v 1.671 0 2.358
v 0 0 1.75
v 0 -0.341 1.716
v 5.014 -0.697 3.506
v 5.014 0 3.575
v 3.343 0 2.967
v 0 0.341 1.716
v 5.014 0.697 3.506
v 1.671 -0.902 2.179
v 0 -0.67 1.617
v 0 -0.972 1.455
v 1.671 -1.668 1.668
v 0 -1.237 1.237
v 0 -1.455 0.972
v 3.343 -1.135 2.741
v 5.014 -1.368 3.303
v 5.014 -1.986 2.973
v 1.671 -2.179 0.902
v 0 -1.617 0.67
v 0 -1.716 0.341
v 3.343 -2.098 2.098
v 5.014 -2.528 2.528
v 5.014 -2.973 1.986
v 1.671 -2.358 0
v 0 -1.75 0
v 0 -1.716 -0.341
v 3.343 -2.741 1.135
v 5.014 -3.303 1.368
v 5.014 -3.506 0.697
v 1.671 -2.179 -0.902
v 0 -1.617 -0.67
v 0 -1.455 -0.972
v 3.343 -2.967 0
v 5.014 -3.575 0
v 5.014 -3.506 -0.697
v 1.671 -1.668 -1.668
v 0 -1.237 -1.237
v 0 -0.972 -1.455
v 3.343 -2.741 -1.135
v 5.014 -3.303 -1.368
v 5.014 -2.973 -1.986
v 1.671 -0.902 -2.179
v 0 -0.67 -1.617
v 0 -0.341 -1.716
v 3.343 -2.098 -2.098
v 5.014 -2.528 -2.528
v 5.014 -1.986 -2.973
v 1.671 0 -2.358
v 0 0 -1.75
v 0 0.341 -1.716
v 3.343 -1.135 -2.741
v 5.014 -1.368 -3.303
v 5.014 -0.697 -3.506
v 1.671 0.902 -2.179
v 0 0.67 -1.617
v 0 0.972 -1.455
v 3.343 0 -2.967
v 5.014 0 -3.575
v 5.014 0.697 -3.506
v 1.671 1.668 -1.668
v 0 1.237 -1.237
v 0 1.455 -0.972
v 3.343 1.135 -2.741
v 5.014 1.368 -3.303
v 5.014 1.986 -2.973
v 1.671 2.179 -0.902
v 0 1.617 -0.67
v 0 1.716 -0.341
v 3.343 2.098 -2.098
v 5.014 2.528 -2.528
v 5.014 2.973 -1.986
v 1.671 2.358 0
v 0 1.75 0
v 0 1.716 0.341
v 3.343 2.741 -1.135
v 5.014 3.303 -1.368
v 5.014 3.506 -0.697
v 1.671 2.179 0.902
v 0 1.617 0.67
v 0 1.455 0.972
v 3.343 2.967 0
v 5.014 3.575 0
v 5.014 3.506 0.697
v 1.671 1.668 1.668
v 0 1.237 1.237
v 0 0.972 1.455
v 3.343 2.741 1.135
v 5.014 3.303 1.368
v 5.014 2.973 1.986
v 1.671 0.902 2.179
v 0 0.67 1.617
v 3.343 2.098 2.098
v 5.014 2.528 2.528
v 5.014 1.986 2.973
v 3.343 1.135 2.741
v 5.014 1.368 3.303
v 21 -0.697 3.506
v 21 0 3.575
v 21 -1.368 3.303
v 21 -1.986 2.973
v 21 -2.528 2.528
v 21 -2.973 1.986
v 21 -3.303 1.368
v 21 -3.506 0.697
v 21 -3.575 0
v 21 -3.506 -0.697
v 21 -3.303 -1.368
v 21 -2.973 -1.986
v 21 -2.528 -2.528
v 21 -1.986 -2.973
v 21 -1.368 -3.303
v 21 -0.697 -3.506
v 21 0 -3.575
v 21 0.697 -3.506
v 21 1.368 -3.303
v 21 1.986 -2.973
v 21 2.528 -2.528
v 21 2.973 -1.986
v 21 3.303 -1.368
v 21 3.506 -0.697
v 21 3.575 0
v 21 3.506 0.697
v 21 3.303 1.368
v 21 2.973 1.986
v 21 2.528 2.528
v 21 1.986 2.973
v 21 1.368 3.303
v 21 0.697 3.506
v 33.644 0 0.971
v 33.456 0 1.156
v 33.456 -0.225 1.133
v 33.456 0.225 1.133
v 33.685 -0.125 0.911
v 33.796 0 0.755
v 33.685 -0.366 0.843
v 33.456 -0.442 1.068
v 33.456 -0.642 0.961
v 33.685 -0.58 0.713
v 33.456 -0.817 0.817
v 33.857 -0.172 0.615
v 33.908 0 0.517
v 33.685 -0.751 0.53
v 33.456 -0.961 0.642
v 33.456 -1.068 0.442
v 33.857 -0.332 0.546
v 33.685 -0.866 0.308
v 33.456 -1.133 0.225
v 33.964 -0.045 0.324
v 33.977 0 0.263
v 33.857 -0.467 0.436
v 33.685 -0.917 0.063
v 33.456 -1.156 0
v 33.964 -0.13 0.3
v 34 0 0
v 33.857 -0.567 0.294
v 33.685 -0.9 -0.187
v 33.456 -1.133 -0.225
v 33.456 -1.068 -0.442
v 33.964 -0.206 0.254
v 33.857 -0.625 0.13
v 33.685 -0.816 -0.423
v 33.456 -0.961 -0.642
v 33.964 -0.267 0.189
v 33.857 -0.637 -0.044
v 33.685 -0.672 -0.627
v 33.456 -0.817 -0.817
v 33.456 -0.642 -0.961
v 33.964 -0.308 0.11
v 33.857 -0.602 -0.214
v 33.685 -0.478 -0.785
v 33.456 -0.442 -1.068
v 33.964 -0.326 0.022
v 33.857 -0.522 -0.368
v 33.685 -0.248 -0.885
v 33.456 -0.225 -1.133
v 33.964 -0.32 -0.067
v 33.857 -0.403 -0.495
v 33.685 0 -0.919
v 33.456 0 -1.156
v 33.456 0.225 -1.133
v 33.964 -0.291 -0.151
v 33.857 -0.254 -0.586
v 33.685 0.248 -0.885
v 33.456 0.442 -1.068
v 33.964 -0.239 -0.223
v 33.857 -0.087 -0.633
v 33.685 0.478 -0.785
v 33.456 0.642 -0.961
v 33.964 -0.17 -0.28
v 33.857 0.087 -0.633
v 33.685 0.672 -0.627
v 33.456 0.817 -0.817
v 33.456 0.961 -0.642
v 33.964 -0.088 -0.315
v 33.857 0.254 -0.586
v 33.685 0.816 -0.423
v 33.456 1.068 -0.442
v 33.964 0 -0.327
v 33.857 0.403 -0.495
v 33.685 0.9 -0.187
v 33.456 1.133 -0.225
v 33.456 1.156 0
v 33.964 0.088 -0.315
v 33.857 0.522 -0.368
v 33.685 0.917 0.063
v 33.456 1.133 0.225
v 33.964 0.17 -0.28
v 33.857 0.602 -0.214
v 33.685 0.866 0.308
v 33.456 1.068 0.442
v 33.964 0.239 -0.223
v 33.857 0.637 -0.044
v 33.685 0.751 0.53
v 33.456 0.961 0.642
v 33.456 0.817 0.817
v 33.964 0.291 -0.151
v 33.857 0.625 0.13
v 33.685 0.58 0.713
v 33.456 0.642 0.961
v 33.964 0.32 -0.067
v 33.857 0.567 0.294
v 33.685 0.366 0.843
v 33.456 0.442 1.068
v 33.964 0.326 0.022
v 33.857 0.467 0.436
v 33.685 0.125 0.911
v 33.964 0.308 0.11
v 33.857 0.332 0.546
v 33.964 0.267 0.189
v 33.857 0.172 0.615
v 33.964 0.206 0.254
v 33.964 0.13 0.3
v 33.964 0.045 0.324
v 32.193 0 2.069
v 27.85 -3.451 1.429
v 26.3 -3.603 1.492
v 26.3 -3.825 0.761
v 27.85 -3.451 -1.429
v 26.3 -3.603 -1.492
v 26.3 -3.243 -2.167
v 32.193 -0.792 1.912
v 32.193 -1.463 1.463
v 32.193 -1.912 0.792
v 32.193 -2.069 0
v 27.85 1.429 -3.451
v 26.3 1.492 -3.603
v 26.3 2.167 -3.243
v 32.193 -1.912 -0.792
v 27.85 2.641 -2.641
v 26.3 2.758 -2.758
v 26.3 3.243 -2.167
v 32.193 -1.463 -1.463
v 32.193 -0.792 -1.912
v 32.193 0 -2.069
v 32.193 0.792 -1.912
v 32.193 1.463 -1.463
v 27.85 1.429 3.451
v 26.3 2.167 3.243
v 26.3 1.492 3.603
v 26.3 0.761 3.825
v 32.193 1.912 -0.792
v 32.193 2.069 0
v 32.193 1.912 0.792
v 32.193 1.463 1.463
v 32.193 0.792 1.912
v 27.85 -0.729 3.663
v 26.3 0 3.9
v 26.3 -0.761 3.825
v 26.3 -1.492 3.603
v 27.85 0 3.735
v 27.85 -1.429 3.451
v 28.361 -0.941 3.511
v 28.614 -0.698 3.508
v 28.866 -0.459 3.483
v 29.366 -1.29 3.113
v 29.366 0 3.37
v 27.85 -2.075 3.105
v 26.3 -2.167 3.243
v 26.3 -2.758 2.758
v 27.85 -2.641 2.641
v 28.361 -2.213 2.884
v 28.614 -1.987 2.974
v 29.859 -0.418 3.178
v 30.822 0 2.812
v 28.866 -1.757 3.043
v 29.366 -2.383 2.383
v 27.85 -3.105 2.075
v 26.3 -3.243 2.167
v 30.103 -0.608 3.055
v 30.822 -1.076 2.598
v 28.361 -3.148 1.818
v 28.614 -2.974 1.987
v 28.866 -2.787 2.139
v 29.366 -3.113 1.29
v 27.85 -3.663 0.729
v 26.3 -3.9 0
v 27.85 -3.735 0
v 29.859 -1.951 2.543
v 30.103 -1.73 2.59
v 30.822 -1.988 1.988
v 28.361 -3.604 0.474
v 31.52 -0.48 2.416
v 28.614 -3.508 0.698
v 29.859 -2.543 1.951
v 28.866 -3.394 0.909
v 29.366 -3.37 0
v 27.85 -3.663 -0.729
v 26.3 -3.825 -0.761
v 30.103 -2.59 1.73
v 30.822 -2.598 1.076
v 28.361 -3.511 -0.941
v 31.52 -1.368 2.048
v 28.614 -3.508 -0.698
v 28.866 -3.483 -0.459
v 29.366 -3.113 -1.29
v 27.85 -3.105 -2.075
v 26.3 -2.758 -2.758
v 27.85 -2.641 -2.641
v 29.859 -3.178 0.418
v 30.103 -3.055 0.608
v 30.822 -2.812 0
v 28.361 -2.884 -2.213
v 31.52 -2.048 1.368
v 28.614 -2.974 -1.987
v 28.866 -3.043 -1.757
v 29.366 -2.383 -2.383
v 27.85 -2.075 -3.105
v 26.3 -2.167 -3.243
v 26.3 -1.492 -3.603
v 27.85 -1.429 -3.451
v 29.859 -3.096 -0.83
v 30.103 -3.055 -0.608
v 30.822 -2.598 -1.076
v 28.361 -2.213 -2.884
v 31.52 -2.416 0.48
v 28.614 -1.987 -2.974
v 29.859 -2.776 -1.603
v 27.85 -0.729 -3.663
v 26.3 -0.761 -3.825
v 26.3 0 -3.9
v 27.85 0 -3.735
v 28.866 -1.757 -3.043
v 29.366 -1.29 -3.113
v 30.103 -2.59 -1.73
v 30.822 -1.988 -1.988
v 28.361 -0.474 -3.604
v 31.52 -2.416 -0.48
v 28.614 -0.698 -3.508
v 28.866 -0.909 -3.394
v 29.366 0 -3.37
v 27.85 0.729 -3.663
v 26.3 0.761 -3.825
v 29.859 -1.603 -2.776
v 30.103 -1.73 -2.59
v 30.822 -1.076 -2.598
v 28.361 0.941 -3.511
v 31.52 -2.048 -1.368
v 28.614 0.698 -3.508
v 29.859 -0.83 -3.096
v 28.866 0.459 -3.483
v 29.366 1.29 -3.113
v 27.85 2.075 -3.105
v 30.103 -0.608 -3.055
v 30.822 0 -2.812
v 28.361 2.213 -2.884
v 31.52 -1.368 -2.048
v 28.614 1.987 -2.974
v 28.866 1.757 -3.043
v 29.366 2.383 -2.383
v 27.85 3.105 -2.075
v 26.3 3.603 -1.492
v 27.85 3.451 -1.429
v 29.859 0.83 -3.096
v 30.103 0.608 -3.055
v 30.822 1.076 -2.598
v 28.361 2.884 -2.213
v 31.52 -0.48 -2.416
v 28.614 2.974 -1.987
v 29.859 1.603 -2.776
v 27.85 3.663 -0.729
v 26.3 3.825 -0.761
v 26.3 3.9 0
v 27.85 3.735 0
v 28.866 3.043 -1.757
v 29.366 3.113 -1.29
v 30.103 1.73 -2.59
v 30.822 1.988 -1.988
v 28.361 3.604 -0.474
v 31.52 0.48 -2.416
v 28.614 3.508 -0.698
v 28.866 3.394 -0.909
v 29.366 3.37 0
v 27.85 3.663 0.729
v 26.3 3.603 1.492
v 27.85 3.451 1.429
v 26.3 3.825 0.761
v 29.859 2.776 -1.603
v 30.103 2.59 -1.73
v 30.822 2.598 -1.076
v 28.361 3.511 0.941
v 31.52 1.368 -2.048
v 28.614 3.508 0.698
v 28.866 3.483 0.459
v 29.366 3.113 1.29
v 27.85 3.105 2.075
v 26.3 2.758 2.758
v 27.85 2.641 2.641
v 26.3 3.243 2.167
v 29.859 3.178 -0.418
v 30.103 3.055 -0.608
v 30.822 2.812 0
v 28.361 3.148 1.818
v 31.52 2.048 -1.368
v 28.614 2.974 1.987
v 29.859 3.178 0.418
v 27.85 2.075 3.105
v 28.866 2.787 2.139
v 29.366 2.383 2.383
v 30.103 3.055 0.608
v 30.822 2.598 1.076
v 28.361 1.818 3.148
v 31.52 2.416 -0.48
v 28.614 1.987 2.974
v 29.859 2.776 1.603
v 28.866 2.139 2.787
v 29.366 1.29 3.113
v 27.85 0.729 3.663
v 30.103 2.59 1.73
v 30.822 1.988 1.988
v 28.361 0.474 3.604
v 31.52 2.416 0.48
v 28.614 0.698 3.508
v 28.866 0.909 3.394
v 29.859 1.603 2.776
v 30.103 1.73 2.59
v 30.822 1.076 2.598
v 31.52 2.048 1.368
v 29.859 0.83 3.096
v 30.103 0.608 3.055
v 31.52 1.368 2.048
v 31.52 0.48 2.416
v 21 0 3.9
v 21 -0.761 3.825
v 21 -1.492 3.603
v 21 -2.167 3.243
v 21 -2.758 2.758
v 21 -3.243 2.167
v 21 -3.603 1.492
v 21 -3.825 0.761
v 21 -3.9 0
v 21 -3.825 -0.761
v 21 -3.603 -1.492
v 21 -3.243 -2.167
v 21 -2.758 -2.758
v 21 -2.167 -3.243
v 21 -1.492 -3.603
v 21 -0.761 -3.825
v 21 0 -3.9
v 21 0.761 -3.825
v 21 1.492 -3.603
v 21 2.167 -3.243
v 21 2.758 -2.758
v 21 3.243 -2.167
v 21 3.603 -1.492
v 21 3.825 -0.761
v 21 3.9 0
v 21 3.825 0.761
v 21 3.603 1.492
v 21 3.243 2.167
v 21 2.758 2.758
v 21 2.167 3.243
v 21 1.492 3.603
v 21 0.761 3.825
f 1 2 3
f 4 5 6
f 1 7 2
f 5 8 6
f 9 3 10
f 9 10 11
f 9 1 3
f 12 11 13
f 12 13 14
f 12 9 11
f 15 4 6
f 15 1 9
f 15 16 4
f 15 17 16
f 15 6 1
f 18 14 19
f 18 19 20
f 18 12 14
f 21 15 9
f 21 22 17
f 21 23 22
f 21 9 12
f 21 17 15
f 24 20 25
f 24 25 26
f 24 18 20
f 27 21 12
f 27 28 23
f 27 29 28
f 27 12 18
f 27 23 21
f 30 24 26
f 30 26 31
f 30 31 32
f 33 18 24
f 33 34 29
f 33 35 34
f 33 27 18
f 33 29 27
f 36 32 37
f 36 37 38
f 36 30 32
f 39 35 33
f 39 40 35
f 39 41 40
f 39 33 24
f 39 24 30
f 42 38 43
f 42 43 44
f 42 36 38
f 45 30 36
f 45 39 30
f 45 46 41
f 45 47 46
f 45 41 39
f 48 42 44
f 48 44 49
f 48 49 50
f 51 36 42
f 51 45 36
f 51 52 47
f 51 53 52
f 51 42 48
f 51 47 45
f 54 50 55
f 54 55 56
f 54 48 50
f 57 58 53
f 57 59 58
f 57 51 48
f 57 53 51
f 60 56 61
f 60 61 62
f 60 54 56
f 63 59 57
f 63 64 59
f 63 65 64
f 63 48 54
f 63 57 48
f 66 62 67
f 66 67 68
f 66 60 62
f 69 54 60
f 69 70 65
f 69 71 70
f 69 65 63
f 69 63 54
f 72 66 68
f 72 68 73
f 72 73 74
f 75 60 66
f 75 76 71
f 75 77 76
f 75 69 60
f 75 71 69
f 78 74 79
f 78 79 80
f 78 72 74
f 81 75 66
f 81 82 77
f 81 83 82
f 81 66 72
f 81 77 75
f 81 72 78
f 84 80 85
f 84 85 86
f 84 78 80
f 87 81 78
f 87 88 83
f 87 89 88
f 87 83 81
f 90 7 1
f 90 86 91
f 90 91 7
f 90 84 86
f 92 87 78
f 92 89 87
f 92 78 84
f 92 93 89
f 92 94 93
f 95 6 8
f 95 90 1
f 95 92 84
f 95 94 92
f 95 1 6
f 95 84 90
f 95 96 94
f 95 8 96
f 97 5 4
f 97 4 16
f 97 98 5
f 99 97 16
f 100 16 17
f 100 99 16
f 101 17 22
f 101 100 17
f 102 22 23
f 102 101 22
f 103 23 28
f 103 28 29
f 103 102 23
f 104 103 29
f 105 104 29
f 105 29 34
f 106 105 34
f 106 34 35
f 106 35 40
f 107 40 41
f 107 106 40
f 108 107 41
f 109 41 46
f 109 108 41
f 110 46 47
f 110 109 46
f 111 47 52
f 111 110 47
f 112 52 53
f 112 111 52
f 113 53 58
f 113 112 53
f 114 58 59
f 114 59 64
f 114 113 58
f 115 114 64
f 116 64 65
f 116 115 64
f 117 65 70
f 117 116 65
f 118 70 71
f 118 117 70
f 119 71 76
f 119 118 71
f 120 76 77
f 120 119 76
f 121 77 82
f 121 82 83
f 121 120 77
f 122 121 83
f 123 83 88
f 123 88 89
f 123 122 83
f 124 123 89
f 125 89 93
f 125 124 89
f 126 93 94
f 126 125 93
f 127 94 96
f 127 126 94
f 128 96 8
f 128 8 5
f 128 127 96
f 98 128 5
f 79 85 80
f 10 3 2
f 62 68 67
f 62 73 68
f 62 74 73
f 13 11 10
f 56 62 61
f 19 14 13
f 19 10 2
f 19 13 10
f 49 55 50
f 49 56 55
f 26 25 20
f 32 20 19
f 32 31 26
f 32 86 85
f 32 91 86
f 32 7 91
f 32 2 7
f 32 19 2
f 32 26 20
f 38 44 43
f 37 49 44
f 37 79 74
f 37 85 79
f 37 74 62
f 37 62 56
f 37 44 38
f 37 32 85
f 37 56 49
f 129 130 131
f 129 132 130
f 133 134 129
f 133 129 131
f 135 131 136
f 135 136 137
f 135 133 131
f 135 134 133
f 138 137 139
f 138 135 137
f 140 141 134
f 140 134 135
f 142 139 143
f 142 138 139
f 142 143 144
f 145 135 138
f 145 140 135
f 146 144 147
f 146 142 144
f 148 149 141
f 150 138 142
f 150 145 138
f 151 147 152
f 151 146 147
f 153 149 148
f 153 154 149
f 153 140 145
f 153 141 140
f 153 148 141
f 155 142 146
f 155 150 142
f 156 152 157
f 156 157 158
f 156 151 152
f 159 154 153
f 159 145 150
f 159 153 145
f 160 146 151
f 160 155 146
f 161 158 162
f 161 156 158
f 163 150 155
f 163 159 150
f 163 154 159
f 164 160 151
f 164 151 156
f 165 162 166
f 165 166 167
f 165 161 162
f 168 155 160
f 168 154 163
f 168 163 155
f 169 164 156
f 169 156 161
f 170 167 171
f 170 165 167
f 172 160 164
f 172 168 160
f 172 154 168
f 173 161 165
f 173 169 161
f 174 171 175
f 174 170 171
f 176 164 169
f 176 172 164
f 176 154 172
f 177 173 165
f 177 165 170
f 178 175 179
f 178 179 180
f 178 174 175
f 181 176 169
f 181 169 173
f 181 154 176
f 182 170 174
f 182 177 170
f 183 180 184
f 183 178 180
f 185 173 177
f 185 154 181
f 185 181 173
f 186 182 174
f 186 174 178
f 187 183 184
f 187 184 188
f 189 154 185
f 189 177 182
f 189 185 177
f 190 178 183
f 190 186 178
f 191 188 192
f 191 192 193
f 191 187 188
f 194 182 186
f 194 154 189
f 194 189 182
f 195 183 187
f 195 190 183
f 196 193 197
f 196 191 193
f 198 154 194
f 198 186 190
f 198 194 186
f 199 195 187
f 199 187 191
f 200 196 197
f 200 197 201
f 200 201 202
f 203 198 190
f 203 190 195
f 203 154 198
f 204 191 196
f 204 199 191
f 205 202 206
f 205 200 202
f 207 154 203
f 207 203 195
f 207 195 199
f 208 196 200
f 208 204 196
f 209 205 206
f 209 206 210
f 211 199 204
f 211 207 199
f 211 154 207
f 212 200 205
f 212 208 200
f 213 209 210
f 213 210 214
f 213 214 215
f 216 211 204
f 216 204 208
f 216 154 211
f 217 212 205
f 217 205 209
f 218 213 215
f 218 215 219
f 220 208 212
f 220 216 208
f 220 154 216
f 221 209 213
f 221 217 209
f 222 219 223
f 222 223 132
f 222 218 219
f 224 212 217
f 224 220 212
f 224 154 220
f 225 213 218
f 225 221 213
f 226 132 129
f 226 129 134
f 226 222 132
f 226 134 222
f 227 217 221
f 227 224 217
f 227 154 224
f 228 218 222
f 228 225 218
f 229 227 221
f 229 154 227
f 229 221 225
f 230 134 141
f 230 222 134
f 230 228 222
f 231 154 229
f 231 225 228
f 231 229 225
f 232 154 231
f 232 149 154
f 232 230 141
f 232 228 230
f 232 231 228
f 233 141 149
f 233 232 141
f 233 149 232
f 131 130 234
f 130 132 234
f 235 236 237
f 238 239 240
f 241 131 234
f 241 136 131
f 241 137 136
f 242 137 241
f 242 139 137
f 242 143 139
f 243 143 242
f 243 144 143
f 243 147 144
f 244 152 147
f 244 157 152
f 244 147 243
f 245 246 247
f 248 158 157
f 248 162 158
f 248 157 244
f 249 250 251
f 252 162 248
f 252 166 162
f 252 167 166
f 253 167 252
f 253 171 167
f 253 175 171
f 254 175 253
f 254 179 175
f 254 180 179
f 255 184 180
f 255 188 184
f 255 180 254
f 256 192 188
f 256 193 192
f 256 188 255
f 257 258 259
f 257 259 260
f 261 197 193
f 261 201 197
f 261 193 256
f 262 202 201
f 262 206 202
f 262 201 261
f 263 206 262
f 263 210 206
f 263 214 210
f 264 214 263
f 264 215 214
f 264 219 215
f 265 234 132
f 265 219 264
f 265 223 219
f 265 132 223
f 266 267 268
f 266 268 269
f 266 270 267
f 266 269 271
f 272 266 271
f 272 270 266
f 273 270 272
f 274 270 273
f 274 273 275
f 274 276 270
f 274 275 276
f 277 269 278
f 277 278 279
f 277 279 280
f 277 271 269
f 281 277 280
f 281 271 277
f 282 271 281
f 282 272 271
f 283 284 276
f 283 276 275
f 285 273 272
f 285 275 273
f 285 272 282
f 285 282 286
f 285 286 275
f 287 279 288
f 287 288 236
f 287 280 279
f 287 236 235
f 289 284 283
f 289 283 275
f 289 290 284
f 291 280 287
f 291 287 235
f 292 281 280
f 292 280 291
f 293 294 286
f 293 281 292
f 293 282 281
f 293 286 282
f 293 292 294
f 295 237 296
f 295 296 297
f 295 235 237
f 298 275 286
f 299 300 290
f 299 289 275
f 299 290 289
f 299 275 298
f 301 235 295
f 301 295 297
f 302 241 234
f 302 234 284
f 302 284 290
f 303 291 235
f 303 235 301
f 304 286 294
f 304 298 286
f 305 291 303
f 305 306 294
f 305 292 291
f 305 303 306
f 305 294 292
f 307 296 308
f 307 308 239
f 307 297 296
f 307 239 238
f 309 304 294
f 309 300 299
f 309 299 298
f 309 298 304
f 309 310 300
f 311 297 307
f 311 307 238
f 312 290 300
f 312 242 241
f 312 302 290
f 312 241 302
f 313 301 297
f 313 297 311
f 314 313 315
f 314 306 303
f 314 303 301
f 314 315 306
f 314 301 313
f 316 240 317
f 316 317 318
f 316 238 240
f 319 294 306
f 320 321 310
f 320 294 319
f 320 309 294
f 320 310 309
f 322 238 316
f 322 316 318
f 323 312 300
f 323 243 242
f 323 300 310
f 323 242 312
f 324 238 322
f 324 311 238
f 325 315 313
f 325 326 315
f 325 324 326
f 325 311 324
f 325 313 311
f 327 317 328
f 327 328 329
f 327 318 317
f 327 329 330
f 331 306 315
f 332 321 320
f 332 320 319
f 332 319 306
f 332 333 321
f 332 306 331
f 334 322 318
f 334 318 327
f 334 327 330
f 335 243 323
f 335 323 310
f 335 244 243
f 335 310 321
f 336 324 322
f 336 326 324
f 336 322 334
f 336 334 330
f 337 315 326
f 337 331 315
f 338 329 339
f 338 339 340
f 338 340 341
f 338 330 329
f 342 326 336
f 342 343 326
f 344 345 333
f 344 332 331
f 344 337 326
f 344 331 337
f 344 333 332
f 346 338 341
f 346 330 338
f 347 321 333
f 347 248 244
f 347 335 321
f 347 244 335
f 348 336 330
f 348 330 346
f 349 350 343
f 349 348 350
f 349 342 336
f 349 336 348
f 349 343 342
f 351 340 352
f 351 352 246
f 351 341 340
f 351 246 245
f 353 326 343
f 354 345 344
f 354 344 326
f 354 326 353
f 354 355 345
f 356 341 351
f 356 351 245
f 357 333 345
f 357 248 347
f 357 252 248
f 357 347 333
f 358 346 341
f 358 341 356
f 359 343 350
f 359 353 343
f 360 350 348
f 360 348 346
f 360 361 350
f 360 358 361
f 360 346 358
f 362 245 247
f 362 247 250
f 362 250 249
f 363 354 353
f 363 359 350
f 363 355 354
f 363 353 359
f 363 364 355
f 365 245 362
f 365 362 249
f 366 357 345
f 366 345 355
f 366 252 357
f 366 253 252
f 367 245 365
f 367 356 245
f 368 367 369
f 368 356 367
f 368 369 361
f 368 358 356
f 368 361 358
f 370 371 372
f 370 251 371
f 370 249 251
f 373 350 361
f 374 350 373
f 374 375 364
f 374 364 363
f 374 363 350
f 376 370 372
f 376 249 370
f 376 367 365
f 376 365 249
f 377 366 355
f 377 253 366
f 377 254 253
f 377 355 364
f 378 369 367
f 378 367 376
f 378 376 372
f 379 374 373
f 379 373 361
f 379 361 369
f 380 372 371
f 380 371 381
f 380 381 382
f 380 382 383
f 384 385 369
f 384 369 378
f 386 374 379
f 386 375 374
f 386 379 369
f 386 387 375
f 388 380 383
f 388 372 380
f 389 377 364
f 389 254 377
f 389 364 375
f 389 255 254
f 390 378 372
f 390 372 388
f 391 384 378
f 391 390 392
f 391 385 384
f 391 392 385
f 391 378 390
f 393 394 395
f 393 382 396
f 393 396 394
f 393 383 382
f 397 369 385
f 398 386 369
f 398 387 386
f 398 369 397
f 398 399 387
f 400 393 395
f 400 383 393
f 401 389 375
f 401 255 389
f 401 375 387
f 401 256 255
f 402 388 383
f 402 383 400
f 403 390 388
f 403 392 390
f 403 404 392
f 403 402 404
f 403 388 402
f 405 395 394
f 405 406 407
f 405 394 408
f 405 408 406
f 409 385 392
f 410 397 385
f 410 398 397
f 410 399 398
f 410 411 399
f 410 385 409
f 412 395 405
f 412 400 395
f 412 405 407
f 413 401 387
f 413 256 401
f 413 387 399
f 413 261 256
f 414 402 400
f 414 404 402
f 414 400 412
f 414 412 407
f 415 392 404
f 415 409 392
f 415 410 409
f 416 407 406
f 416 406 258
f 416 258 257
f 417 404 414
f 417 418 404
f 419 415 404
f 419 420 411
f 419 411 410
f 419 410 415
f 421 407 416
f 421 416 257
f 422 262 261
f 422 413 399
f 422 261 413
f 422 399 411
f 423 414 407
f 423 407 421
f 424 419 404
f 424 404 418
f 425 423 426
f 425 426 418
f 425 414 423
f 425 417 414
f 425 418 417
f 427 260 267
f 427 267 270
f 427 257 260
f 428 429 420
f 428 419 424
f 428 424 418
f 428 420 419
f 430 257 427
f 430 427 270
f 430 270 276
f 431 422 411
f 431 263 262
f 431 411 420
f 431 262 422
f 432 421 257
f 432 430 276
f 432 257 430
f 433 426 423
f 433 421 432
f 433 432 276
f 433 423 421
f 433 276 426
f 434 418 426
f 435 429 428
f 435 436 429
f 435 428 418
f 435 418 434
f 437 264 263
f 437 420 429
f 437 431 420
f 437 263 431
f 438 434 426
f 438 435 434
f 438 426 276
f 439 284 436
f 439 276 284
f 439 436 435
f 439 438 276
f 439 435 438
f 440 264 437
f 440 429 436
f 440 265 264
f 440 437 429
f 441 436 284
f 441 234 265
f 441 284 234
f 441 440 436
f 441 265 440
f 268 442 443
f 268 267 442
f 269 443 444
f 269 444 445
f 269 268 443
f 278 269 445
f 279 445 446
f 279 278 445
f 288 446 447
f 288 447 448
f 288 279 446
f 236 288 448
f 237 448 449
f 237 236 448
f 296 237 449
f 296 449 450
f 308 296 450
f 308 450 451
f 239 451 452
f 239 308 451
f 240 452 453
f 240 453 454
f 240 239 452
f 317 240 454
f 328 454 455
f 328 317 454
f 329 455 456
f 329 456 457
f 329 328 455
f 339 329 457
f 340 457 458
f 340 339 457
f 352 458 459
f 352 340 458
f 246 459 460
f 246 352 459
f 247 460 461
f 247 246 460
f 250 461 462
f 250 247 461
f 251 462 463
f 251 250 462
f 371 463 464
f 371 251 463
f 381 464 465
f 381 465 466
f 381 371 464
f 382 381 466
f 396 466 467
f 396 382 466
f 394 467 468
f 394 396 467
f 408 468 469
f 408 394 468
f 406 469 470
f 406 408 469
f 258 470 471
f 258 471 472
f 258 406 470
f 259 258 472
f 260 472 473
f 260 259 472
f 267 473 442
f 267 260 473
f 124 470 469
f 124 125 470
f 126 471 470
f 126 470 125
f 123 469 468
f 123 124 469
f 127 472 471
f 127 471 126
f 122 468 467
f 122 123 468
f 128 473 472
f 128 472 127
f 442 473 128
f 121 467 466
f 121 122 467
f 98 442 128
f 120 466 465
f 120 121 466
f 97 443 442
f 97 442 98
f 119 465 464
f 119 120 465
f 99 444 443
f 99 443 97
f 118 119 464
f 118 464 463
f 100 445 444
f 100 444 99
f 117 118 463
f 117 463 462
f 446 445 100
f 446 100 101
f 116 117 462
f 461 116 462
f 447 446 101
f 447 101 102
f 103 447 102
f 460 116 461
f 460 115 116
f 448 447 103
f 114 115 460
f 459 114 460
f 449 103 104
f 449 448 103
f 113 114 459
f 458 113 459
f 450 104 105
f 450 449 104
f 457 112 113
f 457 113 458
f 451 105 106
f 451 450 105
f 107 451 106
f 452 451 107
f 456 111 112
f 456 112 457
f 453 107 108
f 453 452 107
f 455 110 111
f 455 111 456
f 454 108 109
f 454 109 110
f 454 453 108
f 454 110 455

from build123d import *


with BuildPart() as part:
    # Esboço1 → Revolução1 (revolve)
    with BuildSketch(Plane.XY, mode=Mode.PRIVATE) as revolu_o1_sk:
        with BuildLine():
            Line((0, 0), (0, 1.75))
            Line((0, 1.75), (5.014146291, 3.575))
            Line((5.014146291, 3.575), (21, 3.575))
            Line((21, 3.575), (21, 3.9))
            Line((21, 3.9), (26.3, 3.9))
            ThreePointArc((26.3, 3.9), (30.103104016, 3.114541229), (33.456230179, 1.155691933))
            ThreePointArc((33.456230179, 1.155691933), (33.857266604, 0.638613628), (34, 0))
            Line((34, 0), (0, 0))
        make_face()
    revolve(revolu_o1_sk.sketch.rotate(Axis((0, 0, 0), (1, 0, 0)), 90), axis=Axis((0, 0, 0), (1, 0, 0)))


solid = part.part
